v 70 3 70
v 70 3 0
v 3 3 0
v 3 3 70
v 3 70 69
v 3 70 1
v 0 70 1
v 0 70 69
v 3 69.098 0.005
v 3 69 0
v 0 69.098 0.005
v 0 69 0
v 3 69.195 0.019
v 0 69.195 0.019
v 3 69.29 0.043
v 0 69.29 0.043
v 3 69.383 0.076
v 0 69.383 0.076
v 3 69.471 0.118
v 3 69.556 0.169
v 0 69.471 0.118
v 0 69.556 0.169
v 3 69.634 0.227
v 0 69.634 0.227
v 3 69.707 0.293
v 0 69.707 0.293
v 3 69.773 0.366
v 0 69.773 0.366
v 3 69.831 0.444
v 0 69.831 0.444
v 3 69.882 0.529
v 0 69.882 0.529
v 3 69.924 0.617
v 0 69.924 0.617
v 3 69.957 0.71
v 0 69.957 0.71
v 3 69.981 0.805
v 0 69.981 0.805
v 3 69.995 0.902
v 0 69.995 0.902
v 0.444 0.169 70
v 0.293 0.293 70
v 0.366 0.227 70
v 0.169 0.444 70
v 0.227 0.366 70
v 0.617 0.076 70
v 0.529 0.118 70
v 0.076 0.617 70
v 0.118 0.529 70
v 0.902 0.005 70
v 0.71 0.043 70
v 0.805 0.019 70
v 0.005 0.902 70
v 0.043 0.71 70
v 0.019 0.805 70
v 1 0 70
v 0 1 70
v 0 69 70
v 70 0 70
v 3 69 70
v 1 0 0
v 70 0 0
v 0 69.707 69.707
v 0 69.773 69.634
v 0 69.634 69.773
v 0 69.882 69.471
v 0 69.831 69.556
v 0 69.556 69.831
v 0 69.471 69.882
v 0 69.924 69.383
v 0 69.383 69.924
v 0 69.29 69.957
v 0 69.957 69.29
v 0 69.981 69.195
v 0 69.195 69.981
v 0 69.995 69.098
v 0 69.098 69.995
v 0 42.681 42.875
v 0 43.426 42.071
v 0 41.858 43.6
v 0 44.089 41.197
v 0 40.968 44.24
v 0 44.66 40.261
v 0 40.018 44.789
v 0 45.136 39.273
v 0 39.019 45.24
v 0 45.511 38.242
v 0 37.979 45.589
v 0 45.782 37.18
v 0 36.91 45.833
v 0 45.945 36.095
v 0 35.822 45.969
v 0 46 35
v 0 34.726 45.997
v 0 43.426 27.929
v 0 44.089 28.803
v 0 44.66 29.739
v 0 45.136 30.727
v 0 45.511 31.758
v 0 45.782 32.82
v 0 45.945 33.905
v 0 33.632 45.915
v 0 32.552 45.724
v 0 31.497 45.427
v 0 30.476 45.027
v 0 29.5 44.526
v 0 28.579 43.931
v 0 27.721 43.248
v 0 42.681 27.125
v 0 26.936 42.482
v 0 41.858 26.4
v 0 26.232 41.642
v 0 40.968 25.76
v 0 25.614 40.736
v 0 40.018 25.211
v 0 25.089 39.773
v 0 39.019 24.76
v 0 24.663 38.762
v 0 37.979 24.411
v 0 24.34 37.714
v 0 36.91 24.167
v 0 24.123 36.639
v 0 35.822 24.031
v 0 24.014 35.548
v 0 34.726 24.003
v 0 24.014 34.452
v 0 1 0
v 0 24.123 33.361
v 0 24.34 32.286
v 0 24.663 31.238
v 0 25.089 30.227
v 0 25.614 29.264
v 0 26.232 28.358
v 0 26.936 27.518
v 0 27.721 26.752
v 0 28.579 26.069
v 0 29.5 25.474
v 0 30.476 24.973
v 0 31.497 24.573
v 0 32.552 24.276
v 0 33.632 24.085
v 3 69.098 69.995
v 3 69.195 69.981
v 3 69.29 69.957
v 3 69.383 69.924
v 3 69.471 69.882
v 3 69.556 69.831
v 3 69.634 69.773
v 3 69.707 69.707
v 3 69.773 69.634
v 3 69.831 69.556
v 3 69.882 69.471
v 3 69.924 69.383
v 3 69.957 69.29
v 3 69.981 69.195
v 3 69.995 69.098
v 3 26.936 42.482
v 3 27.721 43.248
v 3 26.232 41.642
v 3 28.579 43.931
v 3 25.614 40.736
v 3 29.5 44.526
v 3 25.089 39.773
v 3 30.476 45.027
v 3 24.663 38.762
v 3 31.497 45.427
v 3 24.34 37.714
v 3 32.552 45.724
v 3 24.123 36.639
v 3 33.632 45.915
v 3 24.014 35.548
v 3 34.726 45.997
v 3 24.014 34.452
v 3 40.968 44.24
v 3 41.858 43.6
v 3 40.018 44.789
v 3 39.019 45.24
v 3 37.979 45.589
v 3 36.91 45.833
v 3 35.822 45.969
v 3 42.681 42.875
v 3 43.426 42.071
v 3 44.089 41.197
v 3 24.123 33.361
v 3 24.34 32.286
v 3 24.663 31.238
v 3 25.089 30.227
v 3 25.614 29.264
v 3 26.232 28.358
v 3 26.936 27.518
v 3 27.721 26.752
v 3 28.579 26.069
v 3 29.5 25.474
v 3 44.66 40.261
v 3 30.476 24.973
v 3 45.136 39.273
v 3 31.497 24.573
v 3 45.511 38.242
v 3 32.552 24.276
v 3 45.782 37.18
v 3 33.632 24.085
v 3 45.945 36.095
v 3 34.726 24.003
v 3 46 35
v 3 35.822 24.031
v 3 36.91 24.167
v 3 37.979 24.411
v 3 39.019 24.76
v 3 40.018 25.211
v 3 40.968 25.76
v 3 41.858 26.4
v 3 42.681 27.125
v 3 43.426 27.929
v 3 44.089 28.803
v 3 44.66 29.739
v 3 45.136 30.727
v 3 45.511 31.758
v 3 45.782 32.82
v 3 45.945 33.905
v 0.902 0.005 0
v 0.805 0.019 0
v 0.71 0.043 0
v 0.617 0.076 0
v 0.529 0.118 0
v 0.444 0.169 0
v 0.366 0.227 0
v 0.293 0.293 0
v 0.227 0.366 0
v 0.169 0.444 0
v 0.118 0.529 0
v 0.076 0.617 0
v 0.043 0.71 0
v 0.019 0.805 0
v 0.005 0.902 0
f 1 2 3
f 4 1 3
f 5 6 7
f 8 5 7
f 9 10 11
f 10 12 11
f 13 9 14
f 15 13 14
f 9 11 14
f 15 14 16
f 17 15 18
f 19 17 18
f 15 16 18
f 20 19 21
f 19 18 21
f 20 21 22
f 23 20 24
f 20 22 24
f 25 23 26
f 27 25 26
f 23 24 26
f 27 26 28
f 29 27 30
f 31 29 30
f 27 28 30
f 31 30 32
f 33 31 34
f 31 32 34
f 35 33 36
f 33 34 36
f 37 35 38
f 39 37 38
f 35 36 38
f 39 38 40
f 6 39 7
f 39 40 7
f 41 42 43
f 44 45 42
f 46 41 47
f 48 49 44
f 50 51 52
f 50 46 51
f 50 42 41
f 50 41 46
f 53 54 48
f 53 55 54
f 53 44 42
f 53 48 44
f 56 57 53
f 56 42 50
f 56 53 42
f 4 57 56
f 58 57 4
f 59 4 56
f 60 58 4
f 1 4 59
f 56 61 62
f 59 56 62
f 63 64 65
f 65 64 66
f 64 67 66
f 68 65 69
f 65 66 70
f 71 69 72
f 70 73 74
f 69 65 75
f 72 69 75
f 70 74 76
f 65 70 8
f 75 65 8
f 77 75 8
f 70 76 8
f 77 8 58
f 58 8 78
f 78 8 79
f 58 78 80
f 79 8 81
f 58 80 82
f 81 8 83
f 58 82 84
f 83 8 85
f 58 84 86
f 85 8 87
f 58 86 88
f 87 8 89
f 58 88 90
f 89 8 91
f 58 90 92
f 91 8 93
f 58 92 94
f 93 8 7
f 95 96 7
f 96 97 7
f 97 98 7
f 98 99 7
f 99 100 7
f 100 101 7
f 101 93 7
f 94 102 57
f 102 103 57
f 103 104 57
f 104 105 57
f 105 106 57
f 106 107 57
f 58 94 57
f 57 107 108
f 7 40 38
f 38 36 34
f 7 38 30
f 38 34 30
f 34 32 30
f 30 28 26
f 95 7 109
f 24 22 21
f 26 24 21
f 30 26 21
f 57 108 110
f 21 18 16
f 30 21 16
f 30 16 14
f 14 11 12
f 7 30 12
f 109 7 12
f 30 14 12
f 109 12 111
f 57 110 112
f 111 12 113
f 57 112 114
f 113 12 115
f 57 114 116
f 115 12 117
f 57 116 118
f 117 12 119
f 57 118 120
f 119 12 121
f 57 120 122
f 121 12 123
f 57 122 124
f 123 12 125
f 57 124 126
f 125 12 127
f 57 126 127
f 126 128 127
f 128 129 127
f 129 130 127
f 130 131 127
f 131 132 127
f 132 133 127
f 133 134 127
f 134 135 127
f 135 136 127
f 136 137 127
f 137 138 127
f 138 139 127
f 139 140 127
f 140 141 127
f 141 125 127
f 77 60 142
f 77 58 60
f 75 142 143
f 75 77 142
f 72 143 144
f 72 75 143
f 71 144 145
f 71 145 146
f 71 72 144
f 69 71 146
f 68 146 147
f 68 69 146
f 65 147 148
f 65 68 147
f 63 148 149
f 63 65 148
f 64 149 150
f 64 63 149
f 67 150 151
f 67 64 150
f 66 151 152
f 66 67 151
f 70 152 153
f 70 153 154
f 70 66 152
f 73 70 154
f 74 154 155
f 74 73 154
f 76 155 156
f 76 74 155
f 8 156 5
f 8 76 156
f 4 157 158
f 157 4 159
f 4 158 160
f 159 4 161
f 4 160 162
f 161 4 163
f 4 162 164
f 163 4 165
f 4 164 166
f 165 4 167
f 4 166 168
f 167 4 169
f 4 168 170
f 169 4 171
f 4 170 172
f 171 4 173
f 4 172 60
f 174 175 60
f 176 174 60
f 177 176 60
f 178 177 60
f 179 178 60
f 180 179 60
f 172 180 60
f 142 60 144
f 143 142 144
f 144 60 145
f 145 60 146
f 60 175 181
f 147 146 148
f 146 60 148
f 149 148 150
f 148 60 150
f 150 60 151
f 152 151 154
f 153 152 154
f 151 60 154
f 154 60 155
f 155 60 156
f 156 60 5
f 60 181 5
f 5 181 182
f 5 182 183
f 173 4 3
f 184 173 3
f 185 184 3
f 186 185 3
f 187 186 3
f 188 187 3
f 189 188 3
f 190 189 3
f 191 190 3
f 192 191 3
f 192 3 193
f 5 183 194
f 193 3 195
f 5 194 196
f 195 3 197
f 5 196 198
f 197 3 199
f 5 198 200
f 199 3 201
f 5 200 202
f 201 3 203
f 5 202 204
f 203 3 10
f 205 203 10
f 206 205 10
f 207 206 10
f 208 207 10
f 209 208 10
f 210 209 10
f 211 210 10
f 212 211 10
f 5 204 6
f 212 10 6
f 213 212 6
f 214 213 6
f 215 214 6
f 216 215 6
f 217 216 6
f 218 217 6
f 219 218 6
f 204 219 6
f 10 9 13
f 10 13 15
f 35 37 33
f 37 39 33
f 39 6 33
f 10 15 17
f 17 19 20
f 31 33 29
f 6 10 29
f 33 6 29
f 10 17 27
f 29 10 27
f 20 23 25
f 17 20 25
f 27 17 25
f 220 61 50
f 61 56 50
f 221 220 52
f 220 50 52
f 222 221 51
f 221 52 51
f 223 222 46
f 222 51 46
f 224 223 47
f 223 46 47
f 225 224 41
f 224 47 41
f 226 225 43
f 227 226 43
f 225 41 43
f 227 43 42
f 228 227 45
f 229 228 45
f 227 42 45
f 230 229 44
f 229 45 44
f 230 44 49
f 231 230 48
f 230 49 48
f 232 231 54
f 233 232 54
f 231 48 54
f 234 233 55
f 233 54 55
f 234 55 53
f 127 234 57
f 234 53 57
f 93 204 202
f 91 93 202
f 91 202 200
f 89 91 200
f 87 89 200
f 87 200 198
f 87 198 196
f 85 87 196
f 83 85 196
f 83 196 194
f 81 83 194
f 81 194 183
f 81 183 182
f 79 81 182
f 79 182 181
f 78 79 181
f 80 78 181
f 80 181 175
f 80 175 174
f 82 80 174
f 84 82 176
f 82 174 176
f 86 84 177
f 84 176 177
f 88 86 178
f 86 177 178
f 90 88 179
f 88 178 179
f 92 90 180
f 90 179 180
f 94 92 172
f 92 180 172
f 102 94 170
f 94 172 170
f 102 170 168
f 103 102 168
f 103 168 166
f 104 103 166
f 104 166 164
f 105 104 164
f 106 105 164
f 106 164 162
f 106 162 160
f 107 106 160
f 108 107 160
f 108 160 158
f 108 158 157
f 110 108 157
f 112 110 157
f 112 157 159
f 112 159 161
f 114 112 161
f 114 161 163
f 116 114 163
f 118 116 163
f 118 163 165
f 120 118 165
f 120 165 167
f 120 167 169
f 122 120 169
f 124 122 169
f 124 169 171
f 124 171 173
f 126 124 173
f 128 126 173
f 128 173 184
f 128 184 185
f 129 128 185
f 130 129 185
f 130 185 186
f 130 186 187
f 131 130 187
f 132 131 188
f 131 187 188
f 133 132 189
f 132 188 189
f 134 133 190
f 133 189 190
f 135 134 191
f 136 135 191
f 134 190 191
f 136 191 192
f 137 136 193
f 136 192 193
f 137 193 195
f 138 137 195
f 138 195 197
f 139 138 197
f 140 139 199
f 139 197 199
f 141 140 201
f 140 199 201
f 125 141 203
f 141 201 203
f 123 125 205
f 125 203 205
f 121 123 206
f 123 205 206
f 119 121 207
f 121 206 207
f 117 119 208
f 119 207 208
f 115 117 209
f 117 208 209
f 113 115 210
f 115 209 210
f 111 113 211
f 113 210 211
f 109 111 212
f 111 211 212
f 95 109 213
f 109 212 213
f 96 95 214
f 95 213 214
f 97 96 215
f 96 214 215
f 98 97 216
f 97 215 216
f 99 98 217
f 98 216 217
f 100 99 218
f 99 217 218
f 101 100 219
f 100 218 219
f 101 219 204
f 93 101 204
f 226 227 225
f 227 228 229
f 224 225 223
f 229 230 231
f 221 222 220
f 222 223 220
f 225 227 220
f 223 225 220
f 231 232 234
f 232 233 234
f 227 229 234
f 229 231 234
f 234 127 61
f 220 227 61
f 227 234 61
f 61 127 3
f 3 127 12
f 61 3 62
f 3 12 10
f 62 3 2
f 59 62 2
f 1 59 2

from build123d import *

# Parameters (mm, degrees)
BOSS_EXTRU_1_DEPTH      = 70
ESQUISSE2_R             = 11
ENL_V_MAT_EXTRU_1_DEPTH = 70
CONG_8_R                = 1
CONG_9_R                = 1


with BuildPart() as part:
    # Esquisse1 → Boss.-Extru.1 (new body)
    with BuildSketch(Plane.XY):
        Polygon((0, 0), (70, 0), (70, 3), (3, 3), (3, 70), (0, 70), align=None)
    extrude(amount=BOSS_EXTRU_1_DEPTH)

    # Esquisse2 → Enlèv. mat.-Extru.1 (cut)
    with BuildSketch(Plane(origin=(3, 0, 0), x_dir=(0, 0, -1), z_dir=(1, 0, 0))):
        with Locations(Location((-35, 35, 0), (0, 0, 90))):  # turned: the seam where the file's is
            Circle(ESQUISSE2_R)
    extrude(amount=-ENL_V_MAT_EXTRU_1_DEPTH, mode=Mode.SUBTRACT)

    # Congé8
    cong_8_edges = [part.edges().sort_by_distance(p)[0] for p in [
        (0, 0, 35),
    ]]
    fillet(cong_8_edges, radius=CONG_8_R)

    # Congé9
    cong_9_edges = [part.edges().sort_by_distance(p)[0] for p in [
        (1.5, 70, 70),
        (1.5, 70, 0),
    ]]
    fillet(cong_9_edges, radius=CONG_9_R)


solid = part.part
